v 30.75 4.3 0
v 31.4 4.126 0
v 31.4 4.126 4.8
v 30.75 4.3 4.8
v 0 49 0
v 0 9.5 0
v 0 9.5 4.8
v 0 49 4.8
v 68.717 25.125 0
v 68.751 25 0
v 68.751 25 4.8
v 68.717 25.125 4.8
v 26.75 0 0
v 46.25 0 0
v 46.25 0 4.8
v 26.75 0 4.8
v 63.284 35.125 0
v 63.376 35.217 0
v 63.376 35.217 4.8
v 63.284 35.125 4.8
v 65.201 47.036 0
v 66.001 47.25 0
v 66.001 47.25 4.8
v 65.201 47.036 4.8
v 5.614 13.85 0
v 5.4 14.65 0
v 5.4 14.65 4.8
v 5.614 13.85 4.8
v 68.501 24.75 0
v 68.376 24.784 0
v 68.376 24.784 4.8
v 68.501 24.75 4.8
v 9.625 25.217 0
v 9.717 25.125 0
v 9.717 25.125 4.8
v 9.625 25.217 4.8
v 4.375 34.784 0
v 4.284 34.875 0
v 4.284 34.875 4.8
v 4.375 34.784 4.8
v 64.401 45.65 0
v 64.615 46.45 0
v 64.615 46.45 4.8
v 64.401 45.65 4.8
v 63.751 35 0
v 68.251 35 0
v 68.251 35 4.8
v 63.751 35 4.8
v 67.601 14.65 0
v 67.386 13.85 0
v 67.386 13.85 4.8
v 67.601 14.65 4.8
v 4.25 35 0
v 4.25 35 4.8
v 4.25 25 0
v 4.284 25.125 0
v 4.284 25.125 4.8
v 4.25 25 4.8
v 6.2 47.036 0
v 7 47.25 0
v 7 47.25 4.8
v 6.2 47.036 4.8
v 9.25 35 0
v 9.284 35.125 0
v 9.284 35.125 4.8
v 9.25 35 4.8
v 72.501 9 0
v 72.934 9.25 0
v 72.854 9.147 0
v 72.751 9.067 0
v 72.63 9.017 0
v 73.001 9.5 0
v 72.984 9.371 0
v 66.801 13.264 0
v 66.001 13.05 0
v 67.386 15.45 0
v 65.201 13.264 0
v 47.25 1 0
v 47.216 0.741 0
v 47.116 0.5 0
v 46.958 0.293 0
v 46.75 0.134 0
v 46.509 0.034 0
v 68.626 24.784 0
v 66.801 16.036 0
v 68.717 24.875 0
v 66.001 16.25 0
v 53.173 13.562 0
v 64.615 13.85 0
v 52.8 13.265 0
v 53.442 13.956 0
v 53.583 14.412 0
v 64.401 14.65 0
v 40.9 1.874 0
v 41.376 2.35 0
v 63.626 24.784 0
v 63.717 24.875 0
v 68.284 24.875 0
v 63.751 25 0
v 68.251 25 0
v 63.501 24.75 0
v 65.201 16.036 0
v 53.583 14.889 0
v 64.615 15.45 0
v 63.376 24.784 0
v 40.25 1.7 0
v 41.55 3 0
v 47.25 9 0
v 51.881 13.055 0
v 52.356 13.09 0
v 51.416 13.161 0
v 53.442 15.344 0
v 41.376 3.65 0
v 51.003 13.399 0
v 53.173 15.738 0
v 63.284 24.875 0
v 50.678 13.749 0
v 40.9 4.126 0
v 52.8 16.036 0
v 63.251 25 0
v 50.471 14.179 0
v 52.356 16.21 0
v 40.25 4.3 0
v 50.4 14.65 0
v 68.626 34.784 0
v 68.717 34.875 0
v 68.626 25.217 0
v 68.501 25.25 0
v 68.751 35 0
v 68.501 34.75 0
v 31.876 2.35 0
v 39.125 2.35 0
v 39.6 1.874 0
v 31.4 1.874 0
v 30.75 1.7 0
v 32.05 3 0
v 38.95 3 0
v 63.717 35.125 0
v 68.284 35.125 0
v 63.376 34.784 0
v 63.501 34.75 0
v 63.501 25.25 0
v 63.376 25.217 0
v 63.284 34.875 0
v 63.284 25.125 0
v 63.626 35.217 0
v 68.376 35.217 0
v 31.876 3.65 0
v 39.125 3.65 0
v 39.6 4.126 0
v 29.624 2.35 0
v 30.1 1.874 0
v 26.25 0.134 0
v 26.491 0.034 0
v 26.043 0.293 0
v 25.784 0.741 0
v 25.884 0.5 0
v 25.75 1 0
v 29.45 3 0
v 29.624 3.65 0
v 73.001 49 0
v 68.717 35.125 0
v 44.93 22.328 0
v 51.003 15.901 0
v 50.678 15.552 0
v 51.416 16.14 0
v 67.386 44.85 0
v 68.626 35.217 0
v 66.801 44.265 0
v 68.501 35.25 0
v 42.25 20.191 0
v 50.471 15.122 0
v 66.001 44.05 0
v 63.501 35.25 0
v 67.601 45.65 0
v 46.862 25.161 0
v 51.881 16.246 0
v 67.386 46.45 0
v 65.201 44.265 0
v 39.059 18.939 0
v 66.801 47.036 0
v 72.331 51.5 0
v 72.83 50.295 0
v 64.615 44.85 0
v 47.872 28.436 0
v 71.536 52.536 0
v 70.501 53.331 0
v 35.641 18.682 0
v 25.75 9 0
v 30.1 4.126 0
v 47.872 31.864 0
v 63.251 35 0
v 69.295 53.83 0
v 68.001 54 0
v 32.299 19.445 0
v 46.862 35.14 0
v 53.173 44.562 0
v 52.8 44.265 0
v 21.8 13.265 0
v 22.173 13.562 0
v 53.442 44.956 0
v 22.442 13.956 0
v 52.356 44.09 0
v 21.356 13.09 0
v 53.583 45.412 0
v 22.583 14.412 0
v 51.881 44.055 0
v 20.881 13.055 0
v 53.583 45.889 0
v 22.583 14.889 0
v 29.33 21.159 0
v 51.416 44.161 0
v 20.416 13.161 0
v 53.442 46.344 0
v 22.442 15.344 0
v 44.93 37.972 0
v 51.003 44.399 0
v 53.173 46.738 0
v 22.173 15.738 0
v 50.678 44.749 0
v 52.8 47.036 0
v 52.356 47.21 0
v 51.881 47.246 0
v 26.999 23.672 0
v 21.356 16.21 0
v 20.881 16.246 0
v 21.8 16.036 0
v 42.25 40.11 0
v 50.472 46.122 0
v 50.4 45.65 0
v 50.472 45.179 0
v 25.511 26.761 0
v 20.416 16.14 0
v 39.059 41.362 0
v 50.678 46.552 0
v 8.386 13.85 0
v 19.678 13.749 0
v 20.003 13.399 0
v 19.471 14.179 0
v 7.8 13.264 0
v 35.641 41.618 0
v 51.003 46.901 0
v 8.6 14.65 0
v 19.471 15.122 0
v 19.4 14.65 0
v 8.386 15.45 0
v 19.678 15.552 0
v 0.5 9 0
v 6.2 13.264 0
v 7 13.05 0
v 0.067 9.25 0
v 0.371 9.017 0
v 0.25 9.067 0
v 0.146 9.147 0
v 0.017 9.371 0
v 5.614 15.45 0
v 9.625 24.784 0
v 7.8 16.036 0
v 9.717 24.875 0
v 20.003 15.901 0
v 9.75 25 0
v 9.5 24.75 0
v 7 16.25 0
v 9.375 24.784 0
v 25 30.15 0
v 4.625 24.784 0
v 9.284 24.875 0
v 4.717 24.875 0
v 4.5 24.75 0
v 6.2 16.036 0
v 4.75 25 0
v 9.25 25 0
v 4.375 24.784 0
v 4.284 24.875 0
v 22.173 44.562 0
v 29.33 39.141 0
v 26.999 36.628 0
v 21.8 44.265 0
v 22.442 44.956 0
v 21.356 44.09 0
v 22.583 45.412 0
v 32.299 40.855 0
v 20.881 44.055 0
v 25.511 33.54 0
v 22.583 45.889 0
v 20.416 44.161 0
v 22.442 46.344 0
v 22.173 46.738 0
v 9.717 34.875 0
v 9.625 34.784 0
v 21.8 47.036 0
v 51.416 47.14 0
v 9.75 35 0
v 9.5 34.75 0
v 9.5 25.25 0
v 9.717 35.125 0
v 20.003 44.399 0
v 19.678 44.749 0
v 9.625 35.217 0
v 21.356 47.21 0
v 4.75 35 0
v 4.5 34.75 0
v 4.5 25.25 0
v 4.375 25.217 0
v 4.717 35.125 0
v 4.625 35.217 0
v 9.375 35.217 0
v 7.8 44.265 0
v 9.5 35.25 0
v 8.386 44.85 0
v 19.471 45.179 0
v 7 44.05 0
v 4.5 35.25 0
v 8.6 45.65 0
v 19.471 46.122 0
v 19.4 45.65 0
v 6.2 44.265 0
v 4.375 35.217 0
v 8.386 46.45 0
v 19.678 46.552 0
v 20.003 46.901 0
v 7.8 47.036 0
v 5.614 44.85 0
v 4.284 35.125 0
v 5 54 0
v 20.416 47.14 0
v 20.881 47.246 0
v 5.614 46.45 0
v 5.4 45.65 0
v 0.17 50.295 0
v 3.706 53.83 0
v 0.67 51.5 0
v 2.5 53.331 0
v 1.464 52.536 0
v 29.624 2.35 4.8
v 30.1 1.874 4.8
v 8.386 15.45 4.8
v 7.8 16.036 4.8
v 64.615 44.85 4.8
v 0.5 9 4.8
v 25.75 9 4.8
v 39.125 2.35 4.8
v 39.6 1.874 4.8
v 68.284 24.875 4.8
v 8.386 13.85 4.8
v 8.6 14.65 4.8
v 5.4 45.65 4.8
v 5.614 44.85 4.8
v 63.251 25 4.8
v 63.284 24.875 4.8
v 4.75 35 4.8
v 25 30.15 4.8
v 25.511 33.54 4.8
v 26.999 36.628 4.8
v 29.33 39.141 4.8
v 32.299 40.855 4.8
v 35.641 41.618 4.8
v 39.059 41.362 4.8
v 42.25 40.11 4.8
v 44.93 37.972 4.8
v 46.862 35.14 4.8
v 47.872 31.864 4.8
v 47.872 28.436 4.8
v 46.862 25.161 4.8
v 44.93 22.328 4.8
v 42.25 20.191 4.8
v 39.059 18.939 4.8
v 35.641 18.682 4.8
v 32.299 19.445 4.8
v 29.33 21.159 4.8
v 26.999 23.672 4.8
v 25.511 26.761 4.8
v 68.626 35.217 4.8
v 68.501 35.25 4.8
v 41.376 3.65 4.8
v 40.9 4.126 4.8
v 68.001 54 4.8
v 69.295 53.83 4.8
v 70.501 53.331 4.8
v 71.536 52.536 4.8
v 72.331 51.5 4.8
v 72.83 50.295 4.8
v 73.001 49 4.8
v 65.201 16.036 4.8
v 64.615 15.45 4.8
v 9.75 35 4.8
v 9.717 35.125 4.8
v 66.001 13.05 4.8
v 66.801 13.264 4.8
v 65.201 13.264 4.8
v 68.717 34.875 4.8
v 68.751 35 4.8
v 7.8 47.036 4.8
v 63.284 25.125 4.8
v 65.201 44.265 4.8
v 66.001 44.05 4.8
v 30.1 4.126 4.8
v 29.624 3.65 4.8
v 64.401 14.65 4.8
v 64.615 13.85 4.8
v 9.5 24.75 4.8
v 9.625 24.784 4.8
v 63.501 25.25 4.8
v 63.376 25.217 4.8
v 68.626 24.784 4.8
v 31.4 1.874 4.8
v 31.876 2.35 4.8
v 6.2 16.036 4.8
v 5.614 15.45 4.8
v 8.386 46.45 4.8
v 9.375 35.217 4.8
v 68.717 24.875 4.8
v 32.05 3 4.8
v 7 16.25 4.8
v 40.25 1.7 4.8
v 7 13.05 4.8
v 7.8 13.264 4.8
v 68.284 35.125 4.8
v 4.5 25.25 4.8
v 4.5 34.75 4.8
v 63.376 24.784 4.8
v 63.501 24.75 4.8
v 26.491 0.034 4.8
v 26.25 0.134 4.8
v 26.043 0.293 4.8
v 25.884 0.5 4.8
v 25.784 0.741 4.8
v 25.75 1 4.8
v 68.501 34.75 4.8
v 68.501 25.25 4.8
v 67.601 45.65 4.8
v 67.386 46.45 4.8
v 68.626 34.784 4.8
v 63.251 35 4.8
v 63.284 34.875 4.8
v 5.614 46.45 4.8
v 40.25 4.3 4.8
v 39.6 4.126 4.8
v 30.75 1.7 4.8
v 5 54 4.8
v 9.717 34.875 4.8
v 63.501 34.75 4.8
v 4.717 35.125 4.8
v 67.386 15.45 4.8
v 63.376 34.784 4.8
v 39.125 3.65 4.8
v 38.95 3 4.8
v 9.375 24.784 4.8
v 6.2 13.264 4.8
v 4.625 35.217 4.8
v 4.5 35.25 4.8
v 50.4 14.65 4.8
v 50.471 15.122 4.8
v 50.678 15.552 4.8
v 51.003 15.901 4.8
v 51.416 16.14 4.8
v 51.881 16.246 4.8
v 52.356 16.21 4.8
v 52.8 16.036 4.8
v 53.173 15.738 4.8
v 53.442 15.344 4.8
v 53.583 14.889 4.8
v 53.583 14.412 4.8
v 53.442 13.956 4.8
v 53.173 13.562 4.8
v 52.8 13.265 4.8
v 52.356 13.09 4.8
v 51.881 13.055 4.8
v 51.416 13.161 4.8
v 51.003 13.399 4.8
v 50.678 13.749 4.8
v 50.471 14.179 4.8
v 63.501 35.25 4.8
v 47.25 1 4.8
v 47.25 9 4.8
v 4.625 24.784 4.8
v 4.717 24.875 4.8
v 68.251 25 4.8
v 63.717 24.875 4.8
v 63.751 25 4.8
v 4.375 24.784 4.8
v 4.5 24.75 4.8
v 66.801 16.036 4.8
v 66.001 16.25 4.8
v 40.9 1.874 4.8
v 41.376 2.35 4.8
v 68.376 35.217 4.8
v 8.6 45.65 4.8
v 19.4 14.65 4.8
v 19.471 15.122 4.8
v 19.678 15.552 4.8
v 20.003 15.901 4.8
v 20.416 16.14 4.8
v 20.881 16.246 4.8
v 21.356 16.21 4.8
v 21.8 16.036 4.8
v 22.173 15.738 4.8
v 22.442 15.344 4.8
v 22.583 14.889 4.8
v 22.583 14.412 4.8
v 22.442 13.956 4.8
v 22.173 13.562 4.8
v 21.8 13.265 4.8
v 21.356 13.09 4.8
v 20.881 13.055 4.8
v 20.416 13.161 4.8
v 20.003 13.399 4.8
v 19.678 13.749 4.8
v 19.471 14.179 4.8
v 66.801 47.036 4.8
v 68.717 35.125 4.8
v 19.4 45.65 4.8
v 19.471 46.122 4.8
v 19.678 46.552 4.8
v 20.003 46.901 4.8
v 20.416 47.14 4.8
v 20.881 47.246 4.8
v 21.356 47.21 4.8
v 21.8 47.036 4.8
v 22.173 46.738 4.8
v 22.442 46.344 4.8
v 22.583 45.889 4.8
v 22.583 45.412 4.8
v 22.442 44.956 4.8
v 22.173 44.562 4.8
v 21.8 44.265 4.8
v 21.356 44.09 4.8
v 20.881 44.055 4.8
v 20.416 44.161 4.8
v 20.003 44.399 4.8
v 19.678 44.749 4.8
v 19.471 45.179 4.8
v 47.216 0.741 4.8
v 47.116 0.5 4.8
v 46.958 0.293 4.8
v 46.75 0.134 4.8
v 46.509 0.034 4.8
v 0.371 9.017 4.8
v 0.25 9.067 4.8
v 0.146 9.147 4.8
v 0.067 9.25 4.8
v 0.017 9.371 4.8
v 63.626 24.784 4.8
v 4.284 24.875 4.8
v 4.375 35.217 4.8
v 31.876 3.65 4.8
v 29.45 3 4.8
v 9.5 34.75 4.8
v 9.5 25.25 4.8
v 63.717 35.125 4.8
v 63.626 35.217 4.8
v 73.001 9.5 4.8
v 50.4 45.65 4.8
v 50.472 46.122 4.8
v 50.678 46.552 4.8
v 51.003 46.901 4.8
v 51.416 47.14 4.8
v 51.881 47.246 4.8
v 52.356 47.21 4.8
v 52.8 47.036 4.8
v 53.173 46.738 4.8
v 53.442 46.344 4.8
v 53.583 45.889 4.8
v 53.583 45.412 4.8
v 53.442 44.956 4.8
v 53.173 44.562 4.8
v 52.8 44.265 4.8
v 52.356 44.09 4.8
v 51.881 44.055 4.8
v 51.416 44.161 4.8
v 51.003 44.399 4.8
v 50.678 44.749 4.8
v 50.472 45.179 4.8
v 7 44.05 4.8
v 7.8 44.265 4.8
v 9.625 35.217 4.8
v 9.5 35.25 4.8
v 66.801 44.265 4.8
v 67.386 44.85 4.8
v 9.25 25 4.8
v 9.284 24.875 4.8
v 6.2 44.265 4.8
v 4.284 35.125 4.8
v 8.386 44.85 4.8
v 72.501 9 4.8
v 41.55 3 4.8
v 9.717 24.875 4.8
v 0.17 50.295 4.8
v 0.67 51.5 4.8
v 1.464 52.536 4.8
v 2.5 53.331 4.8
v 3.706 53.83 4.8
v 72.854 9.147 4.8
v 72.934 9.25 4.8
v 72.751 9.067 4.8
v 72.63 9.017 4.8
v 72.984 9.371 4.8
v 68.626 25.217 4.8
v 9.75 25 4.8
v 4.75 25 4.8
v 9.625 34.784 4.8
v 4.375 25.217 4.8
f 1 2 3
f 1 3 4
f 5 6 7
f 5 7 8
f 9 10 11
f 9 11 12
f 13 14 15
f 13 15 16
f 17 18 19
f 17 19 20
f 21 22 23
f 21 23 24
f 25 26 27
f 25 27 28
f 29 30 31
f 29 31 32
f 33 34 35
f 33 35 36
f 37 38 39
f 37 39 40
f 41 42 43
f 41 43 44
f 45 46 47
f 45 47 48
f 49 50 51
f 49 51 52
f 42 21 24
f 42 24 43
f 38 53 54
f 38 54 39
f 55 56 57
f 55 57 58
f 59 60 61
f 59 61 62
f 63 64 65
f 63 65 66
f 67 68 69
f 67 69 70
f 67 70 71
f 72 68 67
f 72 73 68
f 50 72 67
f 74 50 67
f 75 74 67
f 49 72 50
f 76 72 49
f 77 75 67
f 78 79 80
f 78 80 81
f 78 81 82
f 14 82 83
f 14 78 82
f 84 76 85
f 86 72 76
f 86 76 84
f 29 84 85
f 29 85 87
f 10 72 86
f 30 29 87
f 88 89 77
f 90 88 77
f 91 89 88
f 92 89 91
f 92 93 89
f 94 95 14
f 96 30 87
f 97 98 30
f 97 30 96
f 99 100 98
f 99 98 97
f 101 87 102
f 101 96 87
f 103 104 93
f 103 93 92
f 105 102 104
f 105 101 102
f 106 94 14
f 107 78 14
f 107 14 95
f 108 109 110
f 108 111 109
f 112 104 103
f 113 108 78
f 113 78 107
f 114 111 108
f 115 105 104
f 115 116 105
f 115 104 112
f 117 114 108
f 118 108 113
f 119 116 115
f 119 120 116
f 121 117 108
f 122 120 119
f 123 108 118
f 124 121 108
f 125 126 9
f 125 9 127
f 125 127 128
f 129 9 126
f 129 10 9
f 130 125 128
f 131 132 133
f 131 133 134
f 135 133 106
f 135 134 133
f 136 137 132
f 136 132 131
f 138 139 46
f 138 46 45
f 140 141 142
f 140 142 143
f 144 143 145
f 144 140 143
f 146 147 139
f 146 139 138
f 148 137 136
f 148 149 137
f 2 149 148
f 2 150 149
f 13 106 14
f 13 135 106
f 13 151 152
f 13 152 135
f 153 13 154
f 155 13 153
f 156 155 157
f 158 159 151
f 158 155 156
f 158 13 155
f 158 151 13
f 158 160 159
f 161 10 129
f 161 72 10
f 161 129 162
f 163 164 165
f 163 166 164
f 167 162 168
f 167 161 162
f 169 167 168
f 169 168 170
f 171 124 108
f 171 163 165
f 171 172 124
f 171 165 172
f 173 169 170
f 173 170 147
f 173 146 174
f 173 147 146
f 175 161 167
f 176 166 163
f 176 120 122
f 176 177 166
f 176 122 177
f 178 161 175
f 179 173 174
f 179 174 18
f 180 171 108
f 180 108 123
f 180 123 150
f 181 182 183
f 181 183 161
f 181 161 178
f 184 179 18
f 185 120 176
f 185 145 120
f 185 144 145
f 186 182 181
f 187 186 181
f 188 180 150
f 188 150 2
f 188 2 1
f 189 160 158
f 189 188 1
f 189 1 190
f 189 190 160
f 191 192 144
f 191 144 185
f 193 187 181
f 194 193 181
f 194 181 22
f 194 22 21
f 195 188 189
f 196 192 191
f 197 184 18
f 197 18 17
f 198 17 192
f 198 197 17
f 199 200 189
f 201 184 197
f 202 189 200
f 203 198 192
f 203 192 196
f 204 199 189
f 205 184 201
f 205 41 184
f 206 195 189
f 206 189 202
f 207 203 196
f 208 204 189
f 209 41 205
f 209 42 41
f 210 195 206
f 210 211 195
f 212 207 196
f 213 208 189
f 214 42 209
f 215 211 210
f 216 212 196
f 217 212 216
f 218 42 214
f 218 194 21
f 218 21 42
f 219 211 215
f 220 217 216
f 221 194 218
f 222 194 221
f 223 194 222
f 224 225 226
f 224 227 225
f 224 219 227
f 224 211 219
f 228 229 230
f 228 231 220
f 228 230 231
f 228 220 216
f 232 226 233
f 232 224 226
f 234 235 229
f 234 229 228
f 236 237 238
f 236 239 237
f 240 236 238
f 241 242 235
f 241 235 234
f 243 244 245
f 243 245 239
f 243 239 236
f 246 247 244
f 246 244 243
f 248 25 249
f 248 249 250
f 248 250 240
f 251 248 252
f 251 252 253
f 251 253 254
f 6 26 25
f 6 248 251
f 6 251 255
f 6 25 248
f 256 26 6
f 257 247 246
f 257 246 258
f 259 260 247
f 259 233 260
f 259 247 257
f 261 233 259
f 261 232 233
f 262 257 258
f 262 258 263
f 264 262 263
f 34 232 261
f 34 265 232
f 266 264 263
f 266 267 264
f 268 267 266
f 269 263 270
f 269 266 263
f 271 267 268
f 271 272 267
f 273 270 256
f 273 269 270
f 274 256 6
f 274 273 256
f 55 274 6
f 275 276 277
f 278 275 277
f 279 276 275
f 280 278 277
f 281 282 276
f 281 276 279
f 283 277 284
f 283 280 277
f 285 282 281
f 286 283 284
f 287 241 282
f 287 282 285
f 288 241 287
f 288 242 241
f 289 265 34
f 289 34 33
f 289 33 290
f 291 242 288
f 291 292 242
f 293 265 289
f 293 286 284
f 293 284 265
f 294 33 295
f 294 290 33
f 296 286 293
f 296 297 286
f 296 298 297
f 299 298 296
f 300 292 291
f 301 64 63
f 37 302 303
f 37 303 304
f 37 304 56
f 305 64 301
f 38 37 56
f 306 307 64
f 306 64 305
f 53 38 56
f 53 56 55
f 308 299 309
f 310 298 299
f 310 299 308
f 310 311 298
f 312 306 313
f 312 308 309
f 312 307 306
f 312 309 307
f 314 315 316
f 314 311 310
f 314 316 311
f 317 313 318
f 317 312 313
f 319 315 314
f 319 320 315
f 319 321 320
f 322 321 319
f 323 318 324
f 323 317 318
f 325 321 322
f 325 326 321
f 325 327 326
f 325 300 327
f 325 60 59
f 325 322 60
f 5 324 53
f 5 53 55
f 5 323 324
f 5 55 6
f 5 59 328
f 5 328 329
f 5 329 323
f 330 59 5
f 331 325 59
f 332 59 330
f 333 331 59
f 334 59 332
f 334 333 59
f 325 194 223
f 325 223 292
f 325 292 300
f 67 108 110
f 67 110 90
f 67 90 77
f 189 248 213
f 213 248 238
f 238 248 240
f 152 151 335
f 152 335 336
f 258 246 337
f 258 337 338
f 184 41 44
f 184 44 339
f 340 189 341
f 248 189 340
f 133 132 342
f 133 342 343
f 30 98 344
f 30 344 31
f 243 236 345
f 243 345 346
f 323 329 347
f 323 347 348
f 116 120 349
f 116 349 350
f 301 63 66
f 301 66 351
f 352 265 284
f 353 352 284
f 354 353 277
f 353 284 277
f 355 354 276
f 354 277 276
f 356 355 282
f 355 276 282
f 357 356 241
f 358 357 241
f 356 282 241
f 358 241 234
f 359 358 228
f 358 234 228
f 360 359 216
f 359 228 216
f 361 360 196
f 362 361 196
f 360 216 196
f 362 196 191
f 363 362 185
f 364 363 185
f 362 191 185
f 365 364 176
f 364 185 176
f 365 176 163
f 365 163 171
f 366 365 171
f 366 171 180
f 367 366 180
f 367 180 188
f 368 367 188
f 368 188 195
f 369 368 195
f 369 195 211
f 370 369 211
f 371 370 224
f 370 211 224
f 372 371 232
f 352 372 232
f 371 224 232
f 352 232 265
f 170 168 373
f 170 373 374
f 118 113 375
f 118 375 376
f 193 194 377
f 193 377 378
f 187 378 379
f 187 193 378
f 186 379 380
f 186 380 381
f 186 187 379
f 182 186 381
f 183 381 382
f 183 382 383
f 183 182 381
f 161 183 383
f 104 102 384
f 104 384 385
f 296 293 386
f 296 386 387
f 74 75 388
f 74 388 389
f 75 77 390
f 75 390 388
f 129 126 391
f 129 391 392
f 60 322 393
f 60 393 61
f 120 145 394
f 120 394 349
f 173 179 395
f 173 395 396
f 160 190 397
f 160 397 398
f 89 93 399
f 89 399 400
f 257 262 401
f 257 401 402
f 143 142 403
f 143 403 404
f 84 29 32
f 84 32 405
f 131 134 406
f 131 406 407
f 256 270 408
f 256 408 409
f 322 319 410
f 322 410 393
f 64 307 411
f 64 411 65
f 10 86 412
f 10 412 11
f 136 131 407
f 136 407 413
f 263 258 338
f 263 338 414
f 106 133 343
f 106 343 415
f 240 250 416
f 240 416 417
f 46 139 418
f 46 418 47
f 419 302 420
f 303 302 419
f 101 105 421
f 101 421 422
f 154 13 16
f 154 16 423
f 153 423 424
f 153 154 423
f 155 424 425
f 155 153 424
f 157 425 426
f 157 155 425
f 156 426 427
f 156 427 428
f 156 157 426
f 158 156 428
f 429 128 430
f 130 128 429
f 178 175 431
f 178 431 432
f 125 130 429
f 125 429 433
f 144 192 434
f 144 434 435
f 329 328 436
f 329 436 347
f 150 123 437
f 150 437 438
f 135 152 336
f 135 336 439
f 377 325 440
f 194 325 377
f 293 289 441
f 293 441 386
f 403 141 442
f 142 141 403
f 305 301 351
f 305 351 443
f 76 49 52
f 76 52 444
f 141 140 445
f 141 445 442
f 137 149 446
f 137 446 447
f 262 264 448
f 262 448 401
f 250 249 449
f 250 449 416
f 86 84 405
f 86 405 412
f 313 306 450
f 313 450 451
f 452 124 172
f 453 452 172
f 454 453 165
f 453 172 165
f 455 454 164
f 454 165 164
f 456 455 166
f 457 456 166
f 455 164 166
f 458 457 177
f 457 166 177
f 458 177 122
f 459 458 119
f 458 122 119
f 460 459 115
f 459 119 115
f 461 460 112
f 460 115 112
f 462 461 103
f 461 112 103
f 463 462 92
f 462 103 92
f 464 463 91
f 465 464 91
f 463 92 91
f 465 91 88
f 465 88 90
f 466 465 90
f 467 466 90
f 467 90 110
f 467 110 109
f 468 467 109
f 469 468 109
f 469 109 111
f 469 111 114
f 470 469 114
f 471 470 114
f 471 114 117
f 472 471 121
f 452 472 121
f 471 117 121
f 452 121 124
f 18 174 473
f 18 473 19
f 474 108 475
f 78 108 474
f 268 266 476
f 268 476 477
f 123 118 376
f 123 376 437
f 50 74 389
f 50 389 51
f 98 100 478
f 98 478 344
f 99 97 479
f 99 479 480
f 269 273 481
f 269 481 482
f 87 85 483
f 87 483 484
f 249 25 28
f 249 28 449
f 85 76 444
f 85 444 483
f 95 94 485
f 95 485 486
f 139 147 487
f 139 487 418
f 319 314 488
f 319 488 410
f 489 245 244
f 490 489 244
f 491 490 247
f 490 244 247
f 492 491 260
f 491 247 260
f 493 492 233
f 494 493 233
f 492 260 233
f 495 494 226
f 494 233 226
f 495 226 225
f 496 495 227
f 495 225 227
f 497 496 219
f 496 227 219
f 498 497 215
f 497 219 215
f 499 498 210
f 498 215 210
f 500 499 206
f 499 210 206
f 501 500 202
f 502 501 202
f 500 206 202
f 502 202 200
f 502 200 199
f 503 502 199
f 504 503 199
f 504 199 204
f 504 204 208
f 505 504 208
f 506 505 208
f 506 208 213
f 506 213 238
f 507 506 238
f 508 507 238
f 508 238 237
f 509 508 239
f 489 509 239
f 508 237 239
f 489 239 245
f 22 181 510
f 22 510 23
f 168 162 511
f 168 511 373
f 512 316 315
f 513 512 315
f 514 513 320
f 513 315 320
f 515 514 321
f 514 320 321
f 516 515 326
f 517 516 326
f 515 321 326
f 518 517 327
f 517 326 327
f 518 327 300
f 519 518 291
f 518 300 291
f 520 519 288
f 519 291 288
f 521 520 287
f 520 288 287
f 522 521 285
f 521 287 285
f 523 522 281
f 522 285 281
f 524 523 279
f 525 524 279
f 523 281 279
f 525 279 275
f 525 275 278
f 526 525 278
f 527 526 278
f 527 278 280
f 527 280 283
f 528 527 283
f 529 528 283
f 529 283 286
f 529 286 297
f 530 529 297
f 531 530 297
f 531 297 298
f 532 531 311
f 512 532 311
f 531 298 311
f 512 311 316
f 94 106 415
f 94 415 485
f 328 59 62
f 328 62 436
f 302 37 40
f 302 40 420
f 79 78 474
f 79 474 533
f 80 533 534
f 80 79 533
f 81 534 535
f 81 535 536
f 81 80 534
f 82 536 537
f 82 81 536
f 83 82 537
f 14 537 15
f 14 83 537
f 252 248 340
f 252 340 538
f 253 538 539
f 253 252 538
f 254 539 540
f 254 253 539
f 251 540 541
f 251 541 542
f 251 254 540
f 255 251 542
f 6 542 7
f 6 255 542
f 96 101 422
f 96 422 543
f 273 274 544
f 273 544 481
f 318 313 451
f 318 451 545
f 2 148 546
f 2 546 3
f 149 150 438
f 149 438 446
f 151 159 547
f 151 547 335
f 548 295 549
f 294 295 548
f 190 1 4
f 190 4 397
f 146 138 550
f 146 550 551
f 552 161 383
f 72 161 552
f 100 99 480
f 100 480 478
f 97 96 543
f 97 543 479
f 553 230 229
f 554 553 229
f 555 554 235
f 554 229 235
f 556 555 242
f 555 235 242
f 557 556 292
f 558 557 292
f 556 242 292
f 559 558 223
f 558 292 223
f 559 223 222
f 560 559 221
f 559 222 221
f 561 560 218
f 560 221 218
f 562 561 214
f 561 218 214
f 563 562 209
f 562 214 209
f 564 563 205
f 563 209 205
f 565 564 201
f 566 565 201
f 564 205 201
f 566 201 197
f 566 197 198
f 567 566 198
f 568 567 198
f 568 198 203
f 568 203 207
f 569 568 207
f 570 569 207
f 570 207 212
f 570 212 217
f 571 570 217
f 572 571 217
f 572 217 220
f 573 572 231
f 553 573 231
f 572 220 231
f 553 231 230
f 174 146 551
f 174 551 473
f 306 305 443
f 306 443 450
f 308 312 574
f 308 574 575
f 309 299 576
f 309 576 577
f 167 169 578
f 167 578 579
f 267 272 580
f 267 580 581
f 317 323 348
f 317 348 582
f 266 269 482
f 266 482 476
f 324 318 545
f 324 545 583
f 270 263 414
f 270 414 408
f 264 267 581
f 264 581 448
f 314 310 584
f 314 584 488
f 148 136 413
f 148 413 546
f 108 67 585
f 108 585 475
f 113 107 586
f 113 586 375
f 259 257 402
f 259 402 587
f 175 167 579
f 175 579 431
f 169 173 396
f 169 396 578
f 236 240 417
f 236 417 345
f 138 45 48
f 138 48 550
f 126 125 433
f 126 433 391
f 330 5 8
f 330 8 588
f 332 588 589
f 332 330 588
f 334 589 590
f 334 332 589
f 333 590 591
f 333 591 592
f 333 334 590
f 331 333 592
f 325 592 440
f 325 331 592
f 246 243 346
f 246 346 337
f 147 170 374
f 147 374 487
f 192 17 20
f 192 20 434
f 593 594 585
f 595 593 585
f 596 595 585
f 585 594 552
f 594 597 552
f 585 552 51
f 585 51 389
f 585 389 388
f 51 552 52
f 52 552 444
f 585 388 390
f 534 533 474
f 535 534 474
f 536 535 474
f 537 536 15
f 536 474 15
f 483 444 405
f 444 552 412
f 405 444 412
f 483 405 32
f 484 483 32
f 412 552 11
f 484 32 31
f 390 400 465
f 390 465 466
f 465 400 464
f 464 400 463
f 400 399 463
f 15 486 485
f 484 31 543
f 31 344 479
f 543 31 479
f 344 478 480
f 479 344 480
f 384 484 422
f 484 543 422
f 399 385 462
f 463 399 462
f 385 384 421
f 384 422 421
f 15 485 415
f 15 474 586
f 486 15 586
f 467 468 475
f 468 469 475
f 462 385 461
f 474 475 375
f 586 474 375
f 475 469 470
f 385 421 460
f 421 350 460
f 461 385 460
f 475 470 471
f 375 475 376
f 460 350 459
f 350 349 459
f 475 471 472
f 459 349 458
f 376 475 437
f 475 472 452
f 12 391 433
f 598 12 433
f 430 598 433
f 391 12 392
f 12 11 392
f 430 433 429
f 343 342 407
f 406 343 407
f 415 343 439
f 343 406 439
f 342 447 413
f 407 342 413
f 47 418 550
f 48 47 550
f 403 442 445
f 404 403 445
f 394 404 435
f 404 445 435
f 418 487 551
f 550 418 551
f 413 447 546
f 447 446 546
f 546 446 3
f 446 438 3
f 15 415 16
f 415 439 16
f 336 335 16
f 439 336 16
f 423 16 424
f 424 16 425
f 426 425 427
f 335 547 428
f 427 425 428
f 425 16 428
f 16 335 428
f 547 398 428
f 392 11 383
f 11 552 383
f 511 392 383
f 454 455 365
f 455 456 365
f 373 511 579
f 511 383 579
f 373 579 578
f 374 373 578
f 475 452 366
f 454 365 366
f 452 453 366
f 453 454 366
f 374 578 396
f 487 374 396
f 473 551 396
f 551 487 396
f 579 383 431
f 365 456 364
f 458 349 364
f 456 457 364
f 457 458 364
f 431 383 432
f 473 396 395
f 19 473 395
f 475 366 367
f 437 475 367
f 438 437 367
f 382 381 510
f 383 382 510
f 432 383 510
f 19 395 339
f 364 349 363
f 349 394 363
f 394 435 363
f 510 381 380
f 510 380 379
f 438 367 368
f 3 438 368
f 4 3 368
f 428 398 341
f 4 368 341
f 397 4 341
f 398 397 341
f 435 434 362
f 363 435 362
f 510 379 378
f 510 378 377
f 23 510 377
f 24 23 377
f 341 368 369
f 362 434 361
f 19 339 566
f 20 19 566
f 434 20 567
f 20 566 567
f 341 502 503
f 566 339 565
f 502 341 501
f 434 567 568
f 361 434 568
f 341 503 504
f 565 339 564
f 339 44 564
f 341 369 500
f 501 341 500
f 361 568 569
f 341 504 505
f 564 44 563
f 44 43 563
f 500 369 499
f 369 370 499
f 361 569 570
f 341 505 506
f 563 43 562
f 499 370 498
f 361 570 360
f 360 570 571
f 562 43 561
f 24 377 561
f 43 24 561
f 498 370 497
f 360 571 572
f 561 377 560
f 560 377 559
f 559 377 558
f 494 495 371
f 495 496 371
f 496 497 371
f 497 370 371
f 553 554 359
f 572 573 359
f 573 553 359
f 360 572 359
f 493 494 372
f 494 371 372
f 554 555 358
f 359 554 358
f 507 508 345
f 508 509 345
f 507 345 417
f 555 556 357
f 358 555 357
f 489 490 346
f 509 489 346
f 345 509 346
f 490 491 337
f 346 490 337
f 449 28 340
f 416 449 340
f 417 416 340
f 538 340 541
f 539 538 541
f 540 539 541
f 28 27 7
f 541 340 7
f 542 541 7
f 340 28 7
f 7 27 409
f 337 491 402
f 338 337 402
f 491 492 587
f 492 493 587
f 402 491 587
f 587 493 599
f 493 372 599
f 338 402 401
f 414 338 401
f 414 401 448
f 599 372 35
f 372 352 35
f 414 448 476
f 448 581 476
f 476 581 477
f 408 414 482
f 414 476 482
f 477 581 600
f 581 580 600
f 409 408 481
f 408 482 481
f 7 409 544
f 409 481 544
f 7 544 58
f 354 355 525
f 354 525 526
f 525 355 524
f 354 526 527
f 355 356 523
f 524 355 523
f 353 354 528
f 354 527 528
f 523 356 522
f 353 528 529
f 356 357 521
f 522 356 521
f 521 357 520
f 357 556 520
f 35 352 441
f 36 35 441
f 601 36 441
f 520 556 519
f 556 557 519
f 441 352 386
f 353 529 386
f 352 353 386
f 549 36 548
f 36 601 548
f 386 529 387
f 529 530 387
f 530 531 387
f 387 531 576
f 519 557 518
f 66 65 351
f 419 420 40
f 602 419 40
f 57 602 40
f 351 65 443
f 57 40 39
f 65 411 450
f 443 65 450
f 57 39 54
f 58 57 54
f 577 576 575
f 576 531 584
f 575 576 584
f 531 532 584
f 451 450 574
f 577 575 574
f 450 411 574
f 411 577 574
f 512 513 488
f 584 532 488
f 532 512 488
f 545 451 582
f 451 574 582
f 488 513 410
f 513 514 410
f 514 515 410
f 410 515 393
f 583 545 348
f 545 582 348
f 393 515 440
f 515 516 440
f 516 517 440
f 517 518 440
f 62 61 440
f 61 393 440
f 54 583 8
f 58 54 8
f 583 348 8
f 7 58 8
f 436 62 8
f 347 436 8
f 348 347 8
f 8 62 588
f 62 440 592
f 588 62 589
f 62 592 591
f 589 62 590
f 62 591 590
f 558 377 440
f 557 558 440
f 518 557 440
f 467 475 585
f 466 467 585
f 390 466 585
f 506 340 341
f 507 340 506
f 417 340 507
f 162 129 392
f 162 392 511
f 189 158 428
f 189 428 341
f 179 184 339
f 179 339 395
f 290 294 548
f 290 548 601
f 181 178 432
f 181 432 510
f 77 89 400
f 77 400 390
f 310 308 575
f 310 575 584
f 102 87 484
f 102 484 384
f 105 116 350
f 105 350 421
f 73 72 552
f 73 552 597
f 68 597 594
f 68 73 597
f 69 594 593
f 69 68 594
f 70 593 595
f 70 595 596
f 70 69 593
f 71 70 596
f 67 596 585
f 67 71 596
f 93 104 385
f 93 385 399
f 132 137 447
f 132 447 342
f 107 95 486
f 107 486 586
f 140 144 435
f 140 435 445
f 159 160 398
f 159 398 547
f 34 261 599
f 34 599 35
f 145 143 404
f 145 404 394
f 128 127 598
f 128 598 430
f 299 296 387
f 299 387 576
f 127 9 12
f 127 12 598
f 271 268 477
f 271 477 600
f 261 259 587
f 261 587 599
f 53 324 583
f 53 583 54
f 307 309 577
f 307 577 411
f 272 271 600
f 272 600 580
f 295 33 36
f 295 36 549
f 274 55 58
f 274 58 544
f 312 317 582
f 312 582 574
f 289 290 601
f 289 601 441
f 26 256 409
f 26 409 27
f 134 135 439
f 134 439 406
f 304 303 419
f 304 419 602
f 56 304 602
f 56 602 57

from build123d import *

# Parameters (mm, degrees)
ESQUISSE1_R        = 11.5
ESQUISSE1_R_2      = 1.6
BOSS_EXTRU_1_DEPTH = 4.8


with BuildPart() as part:
    # Esquisse1 → Boss.-Extru.1 (new body)
    with BuildSketch(Plane(origin=(0, 0, 0), x_dir=(-1, 0, 0), z_dir=(0, 0, -1))):
        with BuildLine():
            Line((0, 9.500081158), (0, 49.000418249))
            ThreePointArc((0, 49.000418249), (-1.464478579, 52.535982296), (-5.000042626, 54.000460875))
            Line((-5.000042626, 54.000460875), (-68.000581364, 54.000460875))
            ThreePointArc((-68.000581364, 54.000460875), (-71.53614516, 52.535982401), (-73.000623635, 49.000418605))
            Line((-73.000623635, 49.000418605), (-73.000623635, 9.500081158))
            ThreePointArc((-73.000623635, 9.500081158), (-72.854175775, 9.146524747), (-72.500619364, 9.000076887))
            Line((-72.500619364, 9.000076887), (-47.250403654, 9.000076887))
            Line((-47.250403654, 9.000076887), (-47.250403654, 1.000007743))
            ThreePointArc((-47.250403654, 1.000007743), (-46.95750587, 0.292889941), (-46.250388068, -7.843e-06))
            Line((-46.250388068, -7.843e-06), (-26.75023547, -7.843e-06))
            ThreePointArc((-26.75023547, -7.843e-06), (-26.043121781, 0.292888237), (-25.750225701, 1.000001925))
            Line((-25.750225701, 1.000001925), (-25.750225701, 9.000076887))
            Line((-25.750225701, 9.000076887), (-0.500004271, 9.000076887))
            ThreePointArc((-0.500004271, 9.000076887), (-0.14644786, 9.146524747), (0, 9.500081158))
        make_face()
        with Locations((-36.5004012, 30.150219609)):
            Circle(ESQUISSE1_R, mode=Mode.SUBTRACT)
        with Locations((-52.0004012, 14.650219609)):
            Circle(ESQUISSE1_R_2, mode=Mode.SUBTRACT)
        with Locations((-52.000444233, 45.650219609)):
            Circle(ESQUISSE1_R_2, mode=Mode.SUBTRACT)
        with Locations((-21.0004012, 14.650219609)):
            Circle(ESQUISSE1_R_2, mode=Mode.SUBTRACT)
        with Locations((-21.0004012, 45.650219609)):
            Circle(ESQUISSE1_R_2, mode=Mode.SUBTRACT)
        Polygon((-6.200052966, 47.036041823), (-5.614406963, 46.45039682), (-5.400046132, 45.650389986), (-5.614406963, 44.850383151), (-6.200052966, 44.264738148), (-7.000059801, 44.050376317), (-7.800066635, 44.264738148), (-8.385711638, 44.850383151), (-8.600073469, 45.650389986), (-8.385711638, 46.45039682), (-7.800066635, 47.036041823), (-7.000059801, 47.250403654), align=None, mode=Mode.SUBTRACT)
        Polygon((-4.750040579, 35.000299003), (-4.716546293, 35.125300071), (-4.625039511, 35.216810853), (-4.500038443, 35.250301139), (-4.375037375, 35.216810853), (-4.283530594, 35.125300071), (-4.250036308, 35.000299003), (-4.283530594, 34.875297935), (-4.375037375, 34.783787154), (-4.500038443, 34.750296868), (-4.500038443, 25.250215709), (-4.375037375, 25.216725423), (-4.283530594, 25.125214642), (-4.250036308, 25.000213574), (-4.283530594, 24.875212506), (-4.375037375, 24.783701724), (-4.500038443, 24.750211438), (-4.625039511, 24.783701724), (-4.716546293, 24.875212506), (-4.750040579, 25.000213574), (-9.250079022, 25.000213574), (-9.283572308, 24.875212506), (-9.37508009, 24.783701724), (-9.500081158, 24.750211438), (-9.625082226, 24.783701724), (-9.716589008, 24.875212506), (-9.750083294, 25.000213574), (-9.716589008, 25.125214642), (-9.625082226, 25.216725423), (-9.500081158, 25.250215709), (-9.500081158, 34.750296868), (-9.625082226, 34.783787154), (-9.716589008, 34.875297935), (-9.750083294, 35.000299003), (-9.716589008, 35.125300071), (-9.625082226, 35.216810853), (-9.500081158, 35.250301139), (-9.37508009, 35.216810853), (-9.283572308, 35.125300071), (-9.250079022, 35.000299003), align=None, mode=Mode.SUBTRACT)
        Polygon((-5.614406963, 15.450131989), (-5.400046132, 14.650125154), (-5.614406963, 13.85011832), (-6.200052966, 13.264473317), (-7.000059801, 13.050111485), (-7.800066635, 13.264473317), (-8.385711638, 13.85011832), (-8.600073469, 14.650125154), (-8.385711638, 15.450131989), (-7.800066635, 16.035776992), (-7.000059801, 16.250138823), (-6.200052966, 16.035776992), align=None, mode=Mode.SUBTRACT)
        Polygon((-30.100257143, 1.874182011), (-30.750262696, 1.700013523), (-31.400268249, 1.874182011), (-31.876102314, 2.350020076), (-32.050273802, 3.000025629), (-31.876102314, 3.650030182), (-31.400268249, 4.125868247), (-30.750262696, 4.300036735), (-30.100257143, 4.125868247), (-29.624423078, 3.650030182), (-29.45025159, 3.000025629), (-29.624423078, 2.350020076), align=None, mode=Mode.SUBTRACT)
        Polygon((-39.600338301, 1.874182011), (-40.250343854, 1.700013523), (-40.900349407, 1.874182011), (-41.376193472, 2.350020076), (-41.55035496, 3.000025629), (-41.376193472, 3.650030182), (-40.900349407, 4.125868247), (-40.250343854, 4.300036735), (-39.600338301, 4.125868247), (-39.124504236, 3.650030182), (-38.950332748, 3.000025629), (-39.124504236, 2.350020076), align=None, mode=Mode.SUBTRACT)
        Polygon((-64.400550166, 14.650125154), (-64.614911997, 13.85011832), (-65.200557, 13.264473317), (-66.000563835, 13.050111485), (-66.800570669, 13.264473317), (-67.386215672, 13.85011832), (-67.600577503, 14.650125154), (-67.386215672, 15.450131989), (-66.800570669, 16.035776992), (-66.000563835, 16.250138823), (-65.200557, 16.035776992), (-64.614911997, 15.450131989), align=None, mode=Mode.SUBTRACT)
        Polygon((-63.625543545, 24.783701724), (-63.717054327, 24.875212506), (-63.750544613, 25.000213574), (-68.250583056, 25.000213574), (-68.284073342, 24.875212506), (-68.375584124, 24.783701724), (-68.500585192, 24.750211438), (-68.62558626, 24.783701724), (-68.717097042, 24.875212506), (-68.750587328, 25.000213574), (-68.717097042, 25.125214642), (-68.62558626, 25.216725423), (-68.500585192, 25.250215709), (-68.500585192, 34.750296868), (-68.62558626, 34.783787154), (-68.717097042, 34.875297935), (-68.750587328, 35.000299003), (-68.717097042, 35.125300071), (-68.62558626, 35.216810853), (-68.500585192, 35.250301139), (-68.375584124, 35.216810853), (-68.284073342, 35.125300071), (-68.250583056, 35.000299003), (-63.750544613, 35.000299003), (-63.717054327, 35.125300071), (-63.625543545, 35.216810853), (-63.500542477, 35.250301139), (-63.375541409, 35.216810853), (-63.284040628, 35.125300071), (-63.250540342, 35.000299003), (-63.284040628, 34.875297935), (-63.375541409, 34.783787154), (-63.500542477, 34.750296868), (-63.500542477, 25.250215709), (-63.375541409, 25.216725423), (-63.284040628, 25.125214642), (-63.250540342, 25.000213574), (-63.284040628, 24.875212506), (-63.375541409, 24.783701724), (-63.500542477, 24.750211438), align=None, mode=Mode.SUBTRACT)
        Polygon((-66.800570669, 47.036041823), (-66.000563835, 47.250403654), (-65.200557, 47.036041823), (-64.614911997, 46.45039682), (-64.400550166, 45.650389986), (-64.614911997, 44.850383151), (-65.200557, 44.264738148), (-66.000563835, 44.050376317), (-66.800570669, 44.264738148), (-67.386215672, 44.850383151), (-67.600577503, 45.650389986), (-67.386215672, 46.45039682), align=None, mode=Mode.SUBTRACT)
    extrude(amount=-BOSS_EXTRU_1_DEPTH)


solid = part.part
